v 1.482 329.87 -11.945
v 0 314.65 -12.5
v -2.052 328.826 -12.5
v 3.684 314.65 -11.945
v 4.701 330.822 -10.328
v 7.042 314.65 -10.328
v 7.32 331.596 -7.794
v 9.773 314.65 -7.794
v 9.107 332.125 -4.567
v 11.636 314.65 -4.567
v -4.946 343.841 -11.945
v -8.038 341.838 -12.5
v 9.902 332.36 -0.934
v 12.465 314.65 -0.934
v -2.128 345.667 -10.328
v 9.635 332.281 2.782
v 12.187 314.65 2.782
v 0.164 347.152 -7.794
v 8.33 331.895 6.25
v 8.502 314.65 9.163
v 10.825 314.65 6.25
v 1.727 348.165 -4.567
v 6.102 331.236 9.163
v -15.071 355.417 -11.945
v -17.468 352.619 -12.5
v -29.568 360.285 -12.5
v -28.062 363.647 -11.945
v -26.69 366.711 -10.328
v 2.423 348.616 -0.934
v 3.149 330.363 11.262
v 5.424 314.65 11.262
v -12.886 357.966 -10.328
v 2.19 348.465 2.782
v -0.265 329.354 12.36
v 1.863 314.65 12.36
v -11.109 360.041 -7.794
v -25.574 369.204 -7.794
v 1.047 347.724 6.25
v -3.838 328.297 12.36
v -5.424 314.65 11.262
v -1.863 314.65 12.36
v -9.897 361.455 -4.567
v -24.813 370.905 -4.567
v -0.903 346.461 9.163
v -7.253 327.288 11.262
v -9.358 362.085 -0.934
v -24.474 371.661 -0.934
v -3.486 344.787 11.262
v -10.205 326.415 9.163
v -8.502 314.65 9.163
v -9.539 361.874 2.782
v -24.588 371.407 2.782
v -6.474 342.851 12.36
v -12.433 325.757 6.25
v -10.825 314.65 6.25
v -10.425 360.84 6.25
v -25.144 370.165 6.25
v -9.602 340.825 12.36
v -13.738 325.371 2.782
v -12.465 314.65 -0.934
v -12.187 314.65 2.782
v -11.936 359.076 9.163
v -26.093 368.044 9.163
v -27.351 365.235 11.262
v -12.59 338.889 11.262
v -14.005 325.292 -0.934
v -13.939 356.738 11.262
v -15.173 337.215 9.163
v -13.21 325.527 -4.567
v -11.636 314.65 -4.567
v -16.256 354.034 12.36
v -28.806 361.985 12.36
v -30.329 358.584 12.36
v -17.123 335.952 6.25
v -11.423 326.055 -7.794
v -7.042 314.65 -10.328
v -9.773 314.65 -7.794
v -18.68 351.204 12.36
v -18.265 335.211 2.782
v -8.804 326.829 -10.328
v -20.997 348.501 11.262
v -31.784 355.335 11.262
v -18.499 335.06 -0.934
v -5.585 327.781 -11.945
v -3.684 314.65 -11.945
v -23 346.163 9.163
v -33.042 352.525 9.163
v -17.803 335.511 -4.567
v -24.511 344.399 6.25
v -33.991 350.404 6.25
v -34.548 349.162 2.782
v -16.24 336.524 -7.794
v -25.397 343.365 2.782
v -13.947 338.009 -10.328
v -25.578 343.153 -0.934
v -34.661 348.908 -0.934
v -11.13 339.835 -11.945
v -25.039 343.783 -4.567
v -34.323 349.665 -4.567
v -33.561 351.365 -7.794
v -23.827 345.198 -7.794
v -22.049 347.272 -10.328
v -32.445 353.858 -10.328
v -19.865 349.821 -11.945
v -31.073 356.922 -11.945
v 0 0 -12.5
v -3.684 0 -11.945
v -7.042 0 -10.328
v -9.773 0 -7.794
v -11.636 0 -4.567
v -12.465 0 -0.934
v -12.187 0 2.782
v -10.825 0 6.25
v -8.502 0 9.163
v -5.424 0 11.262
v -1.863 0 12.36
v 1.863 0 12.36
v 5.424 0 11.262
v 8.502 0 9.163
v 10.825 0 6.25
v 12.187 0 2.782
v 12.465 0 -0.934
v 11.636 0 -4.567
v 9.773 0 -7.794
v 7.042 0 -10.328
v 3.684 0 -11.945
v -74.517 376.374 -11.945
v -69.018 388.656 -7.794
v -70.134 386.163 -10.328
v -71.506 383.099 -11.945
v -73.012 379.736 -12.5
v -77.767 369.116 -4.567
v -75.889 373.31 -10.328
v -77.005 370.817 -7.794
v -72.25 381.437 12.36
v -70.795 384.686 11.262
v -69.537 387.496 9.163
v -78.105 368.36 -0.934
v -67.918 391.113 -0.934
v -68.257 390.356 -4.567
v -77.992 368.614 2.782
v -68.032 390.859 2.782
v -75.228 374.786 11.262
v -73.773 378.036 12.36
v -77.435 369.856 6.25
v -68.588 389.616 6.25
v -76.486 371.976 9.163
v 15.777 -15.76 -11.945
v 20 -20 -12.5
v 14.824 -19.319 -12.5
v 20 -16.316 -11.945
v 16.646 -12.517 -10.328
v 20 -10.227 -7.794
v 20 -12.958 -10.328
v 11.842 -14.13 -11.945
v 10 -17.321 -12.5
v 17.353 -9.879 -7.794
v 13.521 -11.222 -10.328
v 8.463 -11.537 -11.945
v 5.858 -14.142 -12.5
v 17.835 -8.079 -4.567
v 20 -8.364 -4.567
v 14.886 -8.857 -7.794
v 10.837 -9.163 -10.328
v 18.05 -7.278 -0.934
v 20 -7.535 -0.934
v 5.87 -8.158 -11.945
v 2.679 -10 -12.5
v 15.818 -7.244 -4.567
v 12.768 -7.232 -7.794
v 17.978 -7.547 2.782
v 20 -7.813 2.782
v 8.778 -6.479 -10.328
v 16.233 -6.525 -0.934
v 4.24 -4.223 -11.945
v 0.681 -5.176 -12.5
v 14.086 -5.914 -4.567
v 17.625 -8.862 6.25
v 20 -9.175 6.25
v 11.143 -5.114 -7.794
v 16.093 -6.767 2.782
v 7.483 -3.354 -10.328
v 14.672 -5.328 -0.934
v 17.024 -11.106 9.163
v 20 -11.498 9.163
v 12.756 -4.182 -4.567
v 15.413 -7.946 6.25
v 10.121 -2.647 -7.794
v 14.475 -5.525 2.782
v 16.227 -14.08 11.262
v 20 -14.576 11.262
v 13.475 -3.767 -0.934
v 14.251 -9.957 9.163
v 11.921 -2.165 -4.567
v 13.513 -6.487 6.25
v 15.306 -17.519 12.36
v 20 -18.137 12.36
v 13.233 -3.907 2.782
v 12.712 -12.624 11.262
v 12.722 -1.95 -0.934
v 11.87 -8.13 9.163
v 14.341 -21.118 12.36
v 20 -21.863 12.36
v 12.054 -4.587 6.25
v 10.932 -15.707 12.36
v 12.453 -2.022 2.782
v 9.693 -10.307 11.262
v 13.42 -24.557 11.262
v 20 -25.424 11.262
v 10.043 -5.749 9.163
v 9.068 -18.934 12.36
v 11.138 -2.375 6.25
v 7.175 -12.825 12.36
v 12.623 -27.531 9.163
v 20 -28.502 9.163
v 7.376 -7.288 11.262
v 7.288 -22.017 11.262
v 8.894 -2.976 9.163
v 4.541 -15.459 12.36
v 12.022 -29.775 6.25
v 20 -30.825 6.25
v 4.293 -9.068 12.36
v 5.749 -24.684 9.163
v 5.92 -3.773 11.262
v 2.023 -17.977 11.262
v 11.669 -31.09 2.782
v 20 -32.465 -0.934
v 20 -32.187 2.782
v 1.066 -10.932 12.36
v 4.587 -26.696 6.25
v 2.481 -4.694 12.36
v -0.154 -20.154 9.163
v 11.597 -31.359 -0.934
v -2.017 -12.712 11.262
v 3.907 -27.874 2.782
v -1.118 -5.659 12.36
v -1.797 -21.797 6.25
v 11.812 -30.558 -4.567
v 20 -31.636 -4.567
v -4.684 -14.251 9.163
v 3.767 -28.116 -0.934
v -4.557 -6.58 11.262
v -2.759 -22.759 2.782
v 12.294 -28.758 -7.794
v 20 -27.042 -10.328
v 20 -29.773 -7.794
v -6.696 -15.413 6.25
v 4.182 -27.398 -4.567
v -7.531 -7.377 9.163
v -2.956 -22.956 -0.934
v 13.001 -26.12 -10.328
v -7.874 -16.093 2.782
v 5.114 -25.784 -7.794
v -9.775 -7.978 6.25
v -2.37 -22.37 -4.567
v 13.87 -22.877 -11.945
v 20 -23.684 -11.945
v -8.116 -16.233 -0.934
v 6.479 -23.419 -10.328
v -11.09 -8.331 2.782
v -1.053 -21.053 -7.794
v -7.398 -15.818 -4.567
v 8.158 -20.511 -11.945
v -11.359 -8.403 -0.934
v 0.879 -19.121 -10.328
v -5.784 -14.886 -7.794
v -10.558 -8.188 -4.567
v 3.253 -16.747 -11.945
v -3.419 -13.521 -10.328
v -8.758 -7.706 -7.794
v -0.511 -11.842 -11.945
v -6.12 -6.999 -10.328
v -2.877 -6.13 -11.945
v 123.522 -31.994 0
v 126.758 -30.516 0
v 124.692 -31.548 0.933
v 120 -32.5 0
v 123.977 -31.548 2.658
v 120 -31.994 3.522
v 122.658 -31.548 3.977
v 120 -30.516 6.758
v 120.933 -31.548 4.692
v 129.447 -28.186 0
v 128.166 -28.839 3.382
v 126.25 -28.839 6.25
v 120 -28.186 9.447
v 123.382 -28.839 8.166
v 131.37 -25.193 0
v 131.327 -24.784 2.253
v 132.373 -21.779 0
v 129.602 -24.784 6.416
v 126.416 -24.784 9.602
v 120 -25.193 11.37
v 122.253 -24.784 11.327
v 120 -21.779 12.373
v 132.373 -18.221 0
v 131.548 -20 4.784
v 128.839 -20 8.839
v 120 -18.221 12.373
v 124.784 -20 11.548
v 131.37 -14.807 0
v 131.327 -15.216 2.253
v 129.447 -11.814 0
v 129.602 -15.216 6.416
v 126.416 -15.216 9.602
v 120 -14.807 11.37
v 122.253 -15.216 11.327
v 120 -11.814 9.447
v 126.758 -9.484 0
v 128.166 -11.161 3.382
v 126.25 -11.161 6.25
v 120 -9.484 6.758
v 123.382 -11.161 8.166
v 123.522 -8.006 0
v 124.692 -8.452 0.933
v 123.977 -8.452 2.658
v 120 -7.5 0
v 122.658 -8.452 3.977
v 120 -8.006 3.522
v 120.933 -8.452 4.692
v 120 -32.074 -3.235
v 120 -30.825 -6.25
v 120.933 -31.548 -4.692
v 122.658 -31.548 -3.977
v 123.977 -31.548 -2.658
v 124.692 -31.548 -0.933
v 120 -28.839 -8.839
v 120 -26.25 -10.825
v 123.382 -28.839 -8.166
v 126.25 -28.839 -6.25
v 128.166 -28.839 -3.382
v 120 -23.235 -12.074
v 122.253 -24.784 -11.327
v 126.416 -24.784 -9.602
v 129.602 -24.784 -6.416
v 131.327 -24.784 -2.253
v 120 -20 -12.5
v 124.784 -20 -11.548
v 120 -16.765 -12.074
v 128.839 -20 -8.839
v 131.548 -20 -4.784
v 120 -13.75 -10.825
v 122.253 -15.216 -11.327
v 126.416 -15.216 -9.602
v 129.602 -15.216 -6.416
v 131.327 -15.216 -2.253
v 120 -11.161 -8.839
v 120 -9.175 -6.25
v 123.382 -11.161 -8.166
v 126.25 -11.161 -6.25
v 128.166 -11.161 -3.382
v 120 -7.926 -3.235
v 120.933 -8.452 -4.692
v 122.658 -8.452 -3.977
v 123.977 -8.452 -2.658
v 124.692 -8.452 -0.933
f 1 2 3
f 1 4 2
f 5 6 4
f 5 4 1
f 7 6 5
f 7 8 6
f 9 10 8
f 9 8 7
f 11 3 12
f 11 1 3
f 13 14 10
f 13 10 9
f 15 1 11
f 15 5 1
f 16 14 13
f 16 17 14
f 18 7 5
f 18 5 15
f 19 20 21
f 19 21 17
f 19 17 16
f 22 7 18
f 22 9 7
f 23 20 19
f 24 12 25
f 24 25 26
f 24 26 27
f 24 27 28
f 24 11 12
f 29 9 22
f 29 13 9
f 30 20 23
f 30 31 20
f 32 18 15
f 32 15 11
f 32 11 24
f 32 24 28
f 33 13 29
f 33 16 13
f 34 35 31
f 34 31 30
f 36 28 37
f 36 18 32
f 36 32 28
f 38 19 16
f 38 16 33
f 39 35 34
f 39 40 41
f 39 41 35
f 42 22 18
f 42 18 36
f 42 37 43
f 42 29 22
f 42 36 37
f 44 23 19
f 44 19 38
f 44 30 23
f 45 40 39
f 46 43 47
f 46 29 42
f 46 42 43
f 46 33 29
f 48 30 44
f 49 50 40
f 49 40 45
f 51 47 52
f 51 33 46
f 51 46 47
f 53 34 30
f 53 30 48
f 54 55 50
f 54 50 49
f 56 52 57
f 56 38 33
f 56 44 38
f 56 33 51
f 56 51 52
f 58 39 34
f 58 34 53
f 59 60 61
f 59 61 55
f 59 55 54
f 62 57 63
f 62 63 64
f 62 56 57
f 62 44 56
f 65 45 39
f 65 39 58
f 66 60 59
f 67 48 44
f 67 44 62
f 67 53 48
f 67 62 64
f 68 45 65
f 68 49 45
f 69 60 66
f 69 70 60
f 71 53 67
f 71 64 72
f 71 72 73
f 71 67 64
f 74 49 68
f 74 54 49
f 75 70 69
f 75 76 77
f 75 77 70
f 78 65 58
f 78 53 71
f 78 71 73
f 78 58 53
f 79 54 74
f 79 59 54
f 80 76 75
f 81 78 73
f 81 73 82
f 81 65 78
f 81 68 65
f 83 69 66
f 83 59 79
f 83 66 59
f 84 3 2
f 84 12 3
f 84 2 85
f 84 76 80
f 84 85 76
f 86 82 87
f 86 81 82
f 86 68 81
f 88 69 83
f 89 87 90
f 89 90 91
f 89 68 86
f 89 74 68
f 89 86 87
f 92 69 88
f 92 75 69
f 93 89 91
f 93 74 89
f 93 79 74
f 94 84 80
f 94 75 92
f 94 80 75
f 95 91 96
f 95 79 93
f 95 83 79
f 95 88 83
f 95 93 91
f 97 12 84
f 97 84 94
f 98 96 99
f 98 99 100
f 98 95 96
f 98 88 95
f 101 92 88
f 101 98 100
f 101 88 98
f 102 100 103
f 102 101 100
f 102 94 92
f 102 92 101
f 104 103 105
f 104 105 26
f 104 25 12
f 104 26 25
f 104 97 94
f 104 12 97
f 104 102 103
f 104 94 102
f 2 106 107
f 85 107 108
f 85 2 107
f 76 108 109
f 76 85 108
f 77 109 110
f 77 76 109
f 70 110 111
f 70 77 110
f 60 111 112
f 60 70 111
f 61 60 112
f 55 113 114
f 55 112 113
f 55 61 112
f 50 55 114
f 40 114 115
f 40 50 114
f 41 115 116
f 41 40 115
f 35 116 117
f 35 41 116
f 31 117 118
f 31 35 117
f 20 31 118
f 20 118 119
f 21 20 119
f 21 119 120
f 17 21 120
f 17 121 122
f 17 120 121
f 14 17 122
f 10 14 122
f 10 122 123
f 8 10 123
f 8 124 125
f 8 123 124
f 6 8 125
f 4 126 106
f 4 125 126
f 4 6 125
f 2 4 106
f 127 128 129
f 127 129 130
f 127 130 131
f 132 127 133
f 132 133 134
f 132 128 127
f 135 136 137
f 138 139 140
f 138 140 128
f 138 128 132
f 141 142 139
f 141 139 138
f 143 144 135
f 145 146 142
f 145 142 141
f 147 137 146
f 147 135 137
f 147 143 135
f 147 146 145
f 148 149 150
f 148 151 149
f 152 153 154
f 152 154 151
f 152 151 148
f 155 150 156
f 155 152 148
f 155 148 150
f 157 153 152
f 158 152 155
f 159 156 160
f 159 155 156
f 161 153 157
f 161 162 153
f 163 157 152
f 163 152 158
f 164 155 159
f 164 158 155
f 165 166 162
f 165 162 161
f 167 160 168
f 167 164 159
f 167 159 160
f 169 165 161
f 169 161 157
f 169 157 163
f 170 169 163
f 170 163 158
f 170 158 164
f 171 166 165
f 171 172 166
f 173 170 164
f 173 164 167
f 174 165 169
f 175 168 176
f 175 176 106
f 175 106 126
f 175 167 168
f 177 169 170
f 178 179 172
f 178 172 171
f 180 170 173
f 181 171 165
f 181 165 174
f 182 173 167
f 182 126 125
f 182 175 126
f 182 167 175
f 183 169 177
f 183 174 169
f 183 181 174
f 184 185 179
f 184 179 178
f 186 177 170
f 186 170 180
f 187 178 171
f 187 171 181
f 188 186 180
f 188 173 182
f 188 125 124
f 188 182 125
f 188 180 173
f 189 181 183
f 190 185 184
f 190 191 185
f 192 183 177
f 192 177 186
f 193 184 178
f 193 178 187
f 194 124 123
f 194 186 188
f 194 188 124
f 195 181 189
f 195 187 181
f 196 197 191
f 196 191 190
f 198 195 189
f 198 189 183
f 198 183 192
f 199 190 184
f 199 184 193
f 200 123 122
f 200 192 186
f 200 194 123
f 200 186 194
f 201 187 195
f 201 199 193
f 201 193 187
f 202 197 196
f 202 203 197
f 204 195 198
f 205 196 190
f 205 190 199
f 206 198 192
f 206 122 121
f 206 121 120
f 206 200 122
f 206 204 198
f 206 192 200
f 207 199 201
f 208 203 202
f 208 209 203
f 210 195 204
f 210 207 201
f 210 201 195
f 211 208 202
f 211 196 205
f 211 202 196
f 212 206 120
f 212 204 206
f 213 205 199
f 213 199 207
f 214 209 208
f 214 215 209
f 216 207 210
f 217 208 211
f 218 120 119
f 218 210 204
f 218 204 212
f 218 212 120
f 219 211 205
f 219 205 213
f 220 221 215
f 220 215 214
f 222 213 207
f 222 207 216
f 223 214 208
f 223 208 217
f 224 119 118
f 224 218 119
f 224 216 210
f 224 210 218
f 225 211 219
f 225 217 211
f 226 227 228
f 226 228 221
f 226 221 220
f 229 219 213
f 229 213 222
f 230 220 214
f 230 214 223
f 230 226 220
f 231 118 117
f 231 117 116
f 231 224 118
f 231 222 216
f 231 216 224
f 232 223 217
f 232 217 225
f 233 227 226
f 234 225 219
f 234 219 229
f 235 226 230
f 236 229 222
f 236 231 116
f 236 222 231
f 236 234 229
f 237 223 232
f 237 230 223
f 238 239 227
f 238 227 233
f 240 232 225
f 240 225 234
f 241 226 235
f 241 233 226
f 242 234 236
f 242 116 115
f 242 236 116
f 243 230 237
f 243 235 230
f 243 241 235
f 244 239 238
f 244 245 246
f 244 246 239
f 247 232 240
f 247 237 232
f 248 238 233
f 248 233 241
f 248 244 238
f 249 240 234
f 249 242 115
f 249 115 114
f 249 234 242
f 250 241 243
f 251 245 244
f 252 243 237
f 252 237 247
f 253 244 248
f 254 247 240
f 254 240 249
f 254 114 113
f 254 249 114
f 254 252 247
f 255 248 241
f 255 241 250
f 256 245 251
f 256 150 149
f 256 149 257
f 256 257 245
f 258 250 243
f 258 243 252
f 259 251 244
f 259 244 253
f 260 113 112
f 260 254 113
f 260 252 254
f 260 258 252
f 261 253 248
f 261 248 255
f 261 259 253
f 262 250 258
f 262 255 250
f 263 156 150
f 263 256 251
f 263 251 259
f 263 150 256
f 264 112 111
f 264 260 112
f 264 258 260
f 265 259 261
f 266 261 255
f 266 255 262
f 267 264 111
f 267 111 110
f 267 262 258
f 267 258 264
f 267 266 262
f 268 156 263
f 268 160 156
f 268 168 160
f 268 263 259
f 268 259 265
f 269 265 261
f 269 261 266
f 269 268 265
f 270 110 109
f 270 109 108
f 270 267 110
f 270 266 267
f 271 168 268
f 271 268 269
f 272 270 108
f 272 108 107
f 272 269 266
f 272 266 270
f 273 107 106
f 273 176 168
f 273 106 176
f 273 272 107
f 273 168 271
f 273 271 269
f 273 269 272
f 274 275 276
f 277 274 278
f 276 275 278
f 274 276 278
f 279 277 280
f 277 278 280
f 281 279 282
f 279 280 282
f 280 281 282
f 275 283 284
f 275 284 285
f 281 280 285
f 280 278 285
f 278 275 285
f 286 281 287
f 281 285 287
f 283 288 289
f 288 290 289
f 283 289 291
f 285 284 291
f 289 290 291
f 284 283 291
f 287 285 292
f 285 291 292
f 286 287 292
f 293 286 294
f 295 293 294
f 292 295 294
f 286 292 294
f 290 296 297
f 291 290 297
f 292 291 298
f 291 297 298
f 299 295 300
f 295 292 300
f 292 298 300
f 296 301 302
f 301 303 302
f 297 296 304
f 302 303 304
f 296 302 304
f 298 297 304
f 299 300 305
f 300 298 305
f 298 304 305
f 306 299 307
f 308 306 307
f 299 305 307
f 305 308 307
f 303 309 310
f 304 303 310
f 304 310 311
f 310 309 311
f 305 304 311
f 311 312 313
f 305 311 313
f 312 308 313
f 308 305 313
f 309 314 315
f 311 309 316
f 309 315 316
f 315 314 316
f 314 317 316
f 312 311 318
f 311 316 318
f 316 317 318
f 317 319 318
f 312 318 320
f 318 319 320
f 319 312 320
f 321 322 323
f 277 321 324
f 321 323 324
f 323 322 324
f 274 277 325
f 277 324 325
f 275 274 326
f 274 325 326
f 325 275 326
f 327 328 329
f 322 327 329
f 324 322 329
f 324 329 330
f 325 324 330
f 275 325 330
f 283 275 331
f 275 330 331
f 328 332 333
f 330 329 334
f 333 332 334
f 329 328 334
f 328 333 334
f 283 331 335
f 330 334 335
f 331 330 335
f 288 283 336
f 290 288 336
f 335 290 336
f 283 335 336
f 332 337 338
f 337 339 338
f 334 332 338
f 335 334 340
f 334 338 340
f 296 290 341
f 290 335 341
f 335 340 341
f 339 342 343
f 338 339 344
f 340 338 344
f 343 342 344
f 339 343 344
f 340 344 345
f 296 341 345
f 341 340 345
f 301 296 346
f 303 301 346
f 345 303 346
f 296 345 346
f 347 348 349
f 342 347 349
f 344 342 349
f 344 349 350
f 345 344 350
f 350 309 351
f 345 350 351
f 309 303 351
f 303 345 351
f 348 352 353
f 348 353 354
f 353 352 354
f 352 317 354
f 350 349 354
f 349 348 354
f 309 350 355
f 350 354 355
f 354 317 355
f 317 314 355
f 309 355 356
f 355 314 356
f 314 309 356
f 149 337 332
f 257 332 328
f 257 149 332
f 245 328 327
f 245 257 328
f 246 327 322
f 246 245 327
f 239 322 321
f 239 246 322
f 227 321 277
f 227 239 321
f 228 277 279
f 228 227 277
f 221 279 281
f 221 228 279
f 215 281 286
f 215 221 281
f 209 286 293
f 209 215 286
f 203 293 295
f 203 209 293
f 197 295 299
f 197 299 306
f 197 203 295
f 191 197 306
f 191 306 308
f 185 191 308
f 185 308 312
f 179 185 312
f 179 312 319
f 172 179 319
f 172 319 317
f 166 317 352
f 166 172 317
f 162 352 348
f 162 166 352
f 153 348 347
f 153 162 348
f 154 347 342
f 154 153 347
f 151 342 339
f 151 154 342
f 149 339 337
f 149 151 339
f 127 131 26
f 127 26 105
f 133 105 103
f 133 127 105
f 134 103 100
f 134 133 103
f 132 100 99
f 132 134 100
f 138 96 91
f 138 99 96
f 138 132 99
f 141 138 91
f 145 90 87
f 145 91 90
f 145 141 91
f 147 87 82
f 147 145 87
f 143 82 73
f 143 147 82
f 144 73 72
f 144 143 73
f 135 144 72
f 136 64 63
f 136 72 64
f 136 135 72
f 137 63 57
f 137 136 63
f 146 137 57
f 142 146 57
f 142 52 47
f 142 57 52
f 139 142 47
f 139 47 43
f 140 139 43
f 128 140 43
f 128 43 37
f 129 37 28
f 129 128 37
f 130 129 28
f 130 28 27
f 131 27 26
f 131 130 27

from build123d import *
from build123d.topology import SkipClean

# Parameters (mm, degrees)
SWEEP1_PROFILE_R = 12.5


with BuildPart() as part:
    # Sweep1: sweep along a path in Sketch1
    with BuildLine(Plane.XY) as sweep1_path:
        Line((120, -20), (20, -20))
        ThreePointArc((20, -20), (5.857864376, -14.142135624), (0, 0))
        Line((0, 0), (0, 314.65))
        ThreePointArc((0, 314.65), (-8.037977367, 341.838024139), (-29.567546263, 360.28457937))
        Line((-29.567546263, 360.28457937), (-73.011665824, 379.736275328))
    # Sweep1 profile (on start of the path) → Sweep1 (sweep)
    with BuildSketch(Plane(origin=(120, -20, 0), x_dir=(0, 0, -1), z_dir=(-1, 0, 0))):
        Circle(SWEEP1_PROFILE_R)
    sweep(path=sweep1_path.line)

    # Sketch16 → Revolve1 (revolve)
    with SkipClean():  # the faces are left unmerged after this step: merging them gives an invalid solid
        with BuildSketch(Plane.XY):
            with BuildLine():
                Line((120, -7.5), (120, -32.5))
                ThreePointArc((120, -32.5), (132.5, -20), (120, -7.5))
            make_face()
        revolve(axis=Axis((120, -7.5, 0), (0, -1, 0)))


solid = part.part
